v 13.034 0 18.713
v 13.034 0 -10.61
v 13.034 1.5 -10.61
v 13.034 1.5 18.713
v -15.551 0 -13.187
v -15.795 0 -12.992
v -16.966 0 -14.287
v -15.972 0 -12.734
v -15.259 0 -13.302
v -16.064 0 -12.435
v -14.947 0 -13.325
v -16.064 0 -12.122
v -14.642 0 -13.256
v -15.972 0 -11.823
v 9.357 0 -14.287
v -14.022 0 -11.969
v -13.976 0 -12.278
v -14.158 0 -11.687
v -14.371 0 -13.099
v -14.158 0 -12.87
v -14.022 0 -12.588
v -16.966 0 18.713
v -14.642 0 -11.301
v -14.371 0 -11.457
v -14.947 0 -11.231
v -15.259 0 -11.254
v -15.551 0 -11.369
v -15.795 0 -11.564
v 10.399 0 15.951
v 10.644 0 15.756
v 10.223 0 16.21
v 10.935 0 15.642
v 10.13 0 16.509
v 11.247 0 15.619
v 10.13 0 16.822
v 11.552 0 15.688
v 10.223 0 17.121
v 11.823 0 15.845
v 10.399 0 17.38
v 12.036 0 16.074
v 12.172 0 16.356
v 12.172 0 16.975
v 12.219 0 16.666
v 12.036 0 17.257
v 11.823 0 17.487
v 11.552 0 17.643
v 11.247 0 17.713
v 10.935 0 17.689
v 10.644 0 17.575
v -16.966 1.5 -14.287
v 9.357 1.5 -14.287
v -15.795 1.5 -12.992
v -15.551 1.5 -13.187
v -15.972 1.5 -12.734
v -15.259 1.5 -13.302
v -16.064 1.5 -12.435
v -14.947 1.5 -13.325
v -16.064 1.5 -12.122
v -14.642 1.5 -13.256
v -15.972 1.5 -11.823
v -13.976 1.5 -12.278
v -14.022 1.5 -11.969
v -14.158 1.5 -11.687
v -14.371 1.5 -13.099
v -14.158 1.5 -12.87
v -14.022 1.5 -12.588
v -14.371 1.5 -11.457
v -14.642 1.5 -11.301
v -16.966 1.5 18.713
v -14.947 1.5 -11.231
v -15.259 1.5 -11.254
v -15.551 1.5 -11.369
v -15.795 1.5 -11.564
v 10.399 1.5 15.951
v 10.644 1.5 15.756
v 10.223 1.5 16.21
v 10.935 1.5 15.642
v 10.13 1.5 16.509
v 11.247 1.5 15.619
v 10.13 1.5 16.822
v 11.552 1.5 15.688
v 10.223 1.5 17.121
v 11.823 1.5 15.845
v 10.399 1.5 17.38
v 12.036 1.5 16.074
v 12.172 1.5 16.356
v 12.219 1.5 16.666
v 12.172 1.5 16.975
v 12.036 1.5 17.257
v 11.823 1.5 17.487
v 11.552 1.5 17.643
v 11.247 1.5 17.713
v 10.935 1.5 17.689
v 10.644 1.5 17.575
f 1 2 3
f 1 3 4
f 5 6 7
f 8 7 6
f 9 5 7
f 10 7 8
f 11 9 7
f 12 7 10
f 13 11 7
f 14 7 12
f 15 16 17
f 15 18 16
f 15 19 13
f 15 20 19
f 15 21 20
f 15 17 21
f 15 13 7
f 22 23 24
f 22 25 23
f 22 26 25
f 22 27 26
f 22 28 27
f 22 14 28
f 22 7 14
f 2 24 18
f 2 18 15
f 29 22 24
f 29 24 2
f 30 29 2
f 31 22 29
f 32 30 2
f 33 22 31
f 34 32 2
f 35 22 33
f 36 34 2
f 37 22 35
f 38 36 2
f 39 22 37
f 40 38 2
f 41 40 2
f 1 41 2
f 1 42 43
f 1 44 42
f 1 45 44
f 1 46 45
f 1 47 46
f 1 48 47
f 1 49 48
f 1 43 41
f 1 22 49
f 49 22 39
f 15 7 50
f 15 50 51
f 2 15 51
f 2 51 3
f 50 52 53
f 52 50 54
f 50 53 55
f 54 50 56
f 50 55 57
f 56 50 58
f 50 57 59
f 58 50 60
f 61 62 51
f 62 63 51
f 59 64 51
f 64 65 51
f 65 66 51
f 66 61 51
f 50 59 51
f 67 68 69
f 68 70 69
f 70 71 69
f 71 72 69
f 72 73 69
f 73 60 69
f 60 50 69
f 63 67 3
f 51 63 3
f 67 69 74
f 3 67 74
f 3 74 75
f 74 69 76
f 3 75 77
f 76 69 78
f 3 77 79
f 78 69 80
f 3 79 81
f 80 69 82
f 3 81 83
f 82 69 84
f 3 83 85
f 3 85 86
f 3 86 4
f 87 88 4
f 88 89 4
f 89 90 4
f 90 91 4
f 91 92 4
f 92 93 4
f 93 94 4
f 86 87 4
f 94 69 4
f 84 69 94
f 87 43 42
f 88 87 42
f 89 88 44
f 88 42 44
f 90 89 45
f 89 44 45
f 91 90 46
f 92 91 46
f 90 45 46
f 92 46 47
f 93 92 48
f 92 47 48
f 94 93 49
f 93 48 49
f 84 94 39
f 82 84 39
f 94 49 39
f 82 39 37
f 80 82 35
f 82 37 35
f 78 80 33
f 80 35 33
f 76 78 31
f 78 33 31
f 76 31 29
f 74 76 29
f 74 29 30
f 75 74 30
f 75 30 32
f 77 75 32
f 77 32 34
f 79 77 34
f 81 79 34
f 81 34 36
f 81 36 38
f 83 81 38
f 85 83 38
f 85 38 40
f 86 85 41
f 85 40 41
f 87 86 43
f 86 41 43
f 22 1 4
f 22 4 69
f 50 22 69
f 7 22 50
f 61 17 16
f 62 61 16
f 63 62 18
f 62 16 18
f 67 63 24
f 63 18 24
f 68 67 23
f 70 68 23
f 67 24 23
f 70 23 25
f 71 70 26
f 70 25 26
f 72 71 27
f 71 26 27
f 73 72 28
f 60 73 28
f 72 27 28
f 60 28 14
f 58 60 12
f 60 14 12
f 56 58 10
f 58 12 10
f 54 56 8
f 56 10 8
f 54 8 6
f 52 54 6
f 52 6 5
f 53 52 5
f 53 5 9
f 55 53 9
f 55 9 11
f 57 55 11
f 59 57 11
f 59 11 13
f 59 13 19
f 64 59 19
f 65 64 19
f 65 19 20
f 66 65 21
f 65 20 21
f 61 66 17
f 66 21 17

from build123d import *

# Parameters (mm, degrees)
F0_R     = 1.05
F1_DEPTH = 1.5


with BuildPart() as f1:
    # F0 (on Front) → F1 (new body)
    with BuildSketch(Plane.XZ):
        Polygon((13.033743, -10.610216), (13.033743, 18.713196), (-16.966257, 18.713196), (-16.966257, -14.286804), (9.357155, -14.286804), align=None)
        with Locations((-15.025558, -12.278115)):
            Circle(F0_R, mode=Mode.SUBTRACT)
        with Locations((11.168605, 16.665677)):
            Circle(F0_R, mode=Mode.SUBTRACT)
    extrude(amount=-F1_DEPTH)


solid = f1.part
